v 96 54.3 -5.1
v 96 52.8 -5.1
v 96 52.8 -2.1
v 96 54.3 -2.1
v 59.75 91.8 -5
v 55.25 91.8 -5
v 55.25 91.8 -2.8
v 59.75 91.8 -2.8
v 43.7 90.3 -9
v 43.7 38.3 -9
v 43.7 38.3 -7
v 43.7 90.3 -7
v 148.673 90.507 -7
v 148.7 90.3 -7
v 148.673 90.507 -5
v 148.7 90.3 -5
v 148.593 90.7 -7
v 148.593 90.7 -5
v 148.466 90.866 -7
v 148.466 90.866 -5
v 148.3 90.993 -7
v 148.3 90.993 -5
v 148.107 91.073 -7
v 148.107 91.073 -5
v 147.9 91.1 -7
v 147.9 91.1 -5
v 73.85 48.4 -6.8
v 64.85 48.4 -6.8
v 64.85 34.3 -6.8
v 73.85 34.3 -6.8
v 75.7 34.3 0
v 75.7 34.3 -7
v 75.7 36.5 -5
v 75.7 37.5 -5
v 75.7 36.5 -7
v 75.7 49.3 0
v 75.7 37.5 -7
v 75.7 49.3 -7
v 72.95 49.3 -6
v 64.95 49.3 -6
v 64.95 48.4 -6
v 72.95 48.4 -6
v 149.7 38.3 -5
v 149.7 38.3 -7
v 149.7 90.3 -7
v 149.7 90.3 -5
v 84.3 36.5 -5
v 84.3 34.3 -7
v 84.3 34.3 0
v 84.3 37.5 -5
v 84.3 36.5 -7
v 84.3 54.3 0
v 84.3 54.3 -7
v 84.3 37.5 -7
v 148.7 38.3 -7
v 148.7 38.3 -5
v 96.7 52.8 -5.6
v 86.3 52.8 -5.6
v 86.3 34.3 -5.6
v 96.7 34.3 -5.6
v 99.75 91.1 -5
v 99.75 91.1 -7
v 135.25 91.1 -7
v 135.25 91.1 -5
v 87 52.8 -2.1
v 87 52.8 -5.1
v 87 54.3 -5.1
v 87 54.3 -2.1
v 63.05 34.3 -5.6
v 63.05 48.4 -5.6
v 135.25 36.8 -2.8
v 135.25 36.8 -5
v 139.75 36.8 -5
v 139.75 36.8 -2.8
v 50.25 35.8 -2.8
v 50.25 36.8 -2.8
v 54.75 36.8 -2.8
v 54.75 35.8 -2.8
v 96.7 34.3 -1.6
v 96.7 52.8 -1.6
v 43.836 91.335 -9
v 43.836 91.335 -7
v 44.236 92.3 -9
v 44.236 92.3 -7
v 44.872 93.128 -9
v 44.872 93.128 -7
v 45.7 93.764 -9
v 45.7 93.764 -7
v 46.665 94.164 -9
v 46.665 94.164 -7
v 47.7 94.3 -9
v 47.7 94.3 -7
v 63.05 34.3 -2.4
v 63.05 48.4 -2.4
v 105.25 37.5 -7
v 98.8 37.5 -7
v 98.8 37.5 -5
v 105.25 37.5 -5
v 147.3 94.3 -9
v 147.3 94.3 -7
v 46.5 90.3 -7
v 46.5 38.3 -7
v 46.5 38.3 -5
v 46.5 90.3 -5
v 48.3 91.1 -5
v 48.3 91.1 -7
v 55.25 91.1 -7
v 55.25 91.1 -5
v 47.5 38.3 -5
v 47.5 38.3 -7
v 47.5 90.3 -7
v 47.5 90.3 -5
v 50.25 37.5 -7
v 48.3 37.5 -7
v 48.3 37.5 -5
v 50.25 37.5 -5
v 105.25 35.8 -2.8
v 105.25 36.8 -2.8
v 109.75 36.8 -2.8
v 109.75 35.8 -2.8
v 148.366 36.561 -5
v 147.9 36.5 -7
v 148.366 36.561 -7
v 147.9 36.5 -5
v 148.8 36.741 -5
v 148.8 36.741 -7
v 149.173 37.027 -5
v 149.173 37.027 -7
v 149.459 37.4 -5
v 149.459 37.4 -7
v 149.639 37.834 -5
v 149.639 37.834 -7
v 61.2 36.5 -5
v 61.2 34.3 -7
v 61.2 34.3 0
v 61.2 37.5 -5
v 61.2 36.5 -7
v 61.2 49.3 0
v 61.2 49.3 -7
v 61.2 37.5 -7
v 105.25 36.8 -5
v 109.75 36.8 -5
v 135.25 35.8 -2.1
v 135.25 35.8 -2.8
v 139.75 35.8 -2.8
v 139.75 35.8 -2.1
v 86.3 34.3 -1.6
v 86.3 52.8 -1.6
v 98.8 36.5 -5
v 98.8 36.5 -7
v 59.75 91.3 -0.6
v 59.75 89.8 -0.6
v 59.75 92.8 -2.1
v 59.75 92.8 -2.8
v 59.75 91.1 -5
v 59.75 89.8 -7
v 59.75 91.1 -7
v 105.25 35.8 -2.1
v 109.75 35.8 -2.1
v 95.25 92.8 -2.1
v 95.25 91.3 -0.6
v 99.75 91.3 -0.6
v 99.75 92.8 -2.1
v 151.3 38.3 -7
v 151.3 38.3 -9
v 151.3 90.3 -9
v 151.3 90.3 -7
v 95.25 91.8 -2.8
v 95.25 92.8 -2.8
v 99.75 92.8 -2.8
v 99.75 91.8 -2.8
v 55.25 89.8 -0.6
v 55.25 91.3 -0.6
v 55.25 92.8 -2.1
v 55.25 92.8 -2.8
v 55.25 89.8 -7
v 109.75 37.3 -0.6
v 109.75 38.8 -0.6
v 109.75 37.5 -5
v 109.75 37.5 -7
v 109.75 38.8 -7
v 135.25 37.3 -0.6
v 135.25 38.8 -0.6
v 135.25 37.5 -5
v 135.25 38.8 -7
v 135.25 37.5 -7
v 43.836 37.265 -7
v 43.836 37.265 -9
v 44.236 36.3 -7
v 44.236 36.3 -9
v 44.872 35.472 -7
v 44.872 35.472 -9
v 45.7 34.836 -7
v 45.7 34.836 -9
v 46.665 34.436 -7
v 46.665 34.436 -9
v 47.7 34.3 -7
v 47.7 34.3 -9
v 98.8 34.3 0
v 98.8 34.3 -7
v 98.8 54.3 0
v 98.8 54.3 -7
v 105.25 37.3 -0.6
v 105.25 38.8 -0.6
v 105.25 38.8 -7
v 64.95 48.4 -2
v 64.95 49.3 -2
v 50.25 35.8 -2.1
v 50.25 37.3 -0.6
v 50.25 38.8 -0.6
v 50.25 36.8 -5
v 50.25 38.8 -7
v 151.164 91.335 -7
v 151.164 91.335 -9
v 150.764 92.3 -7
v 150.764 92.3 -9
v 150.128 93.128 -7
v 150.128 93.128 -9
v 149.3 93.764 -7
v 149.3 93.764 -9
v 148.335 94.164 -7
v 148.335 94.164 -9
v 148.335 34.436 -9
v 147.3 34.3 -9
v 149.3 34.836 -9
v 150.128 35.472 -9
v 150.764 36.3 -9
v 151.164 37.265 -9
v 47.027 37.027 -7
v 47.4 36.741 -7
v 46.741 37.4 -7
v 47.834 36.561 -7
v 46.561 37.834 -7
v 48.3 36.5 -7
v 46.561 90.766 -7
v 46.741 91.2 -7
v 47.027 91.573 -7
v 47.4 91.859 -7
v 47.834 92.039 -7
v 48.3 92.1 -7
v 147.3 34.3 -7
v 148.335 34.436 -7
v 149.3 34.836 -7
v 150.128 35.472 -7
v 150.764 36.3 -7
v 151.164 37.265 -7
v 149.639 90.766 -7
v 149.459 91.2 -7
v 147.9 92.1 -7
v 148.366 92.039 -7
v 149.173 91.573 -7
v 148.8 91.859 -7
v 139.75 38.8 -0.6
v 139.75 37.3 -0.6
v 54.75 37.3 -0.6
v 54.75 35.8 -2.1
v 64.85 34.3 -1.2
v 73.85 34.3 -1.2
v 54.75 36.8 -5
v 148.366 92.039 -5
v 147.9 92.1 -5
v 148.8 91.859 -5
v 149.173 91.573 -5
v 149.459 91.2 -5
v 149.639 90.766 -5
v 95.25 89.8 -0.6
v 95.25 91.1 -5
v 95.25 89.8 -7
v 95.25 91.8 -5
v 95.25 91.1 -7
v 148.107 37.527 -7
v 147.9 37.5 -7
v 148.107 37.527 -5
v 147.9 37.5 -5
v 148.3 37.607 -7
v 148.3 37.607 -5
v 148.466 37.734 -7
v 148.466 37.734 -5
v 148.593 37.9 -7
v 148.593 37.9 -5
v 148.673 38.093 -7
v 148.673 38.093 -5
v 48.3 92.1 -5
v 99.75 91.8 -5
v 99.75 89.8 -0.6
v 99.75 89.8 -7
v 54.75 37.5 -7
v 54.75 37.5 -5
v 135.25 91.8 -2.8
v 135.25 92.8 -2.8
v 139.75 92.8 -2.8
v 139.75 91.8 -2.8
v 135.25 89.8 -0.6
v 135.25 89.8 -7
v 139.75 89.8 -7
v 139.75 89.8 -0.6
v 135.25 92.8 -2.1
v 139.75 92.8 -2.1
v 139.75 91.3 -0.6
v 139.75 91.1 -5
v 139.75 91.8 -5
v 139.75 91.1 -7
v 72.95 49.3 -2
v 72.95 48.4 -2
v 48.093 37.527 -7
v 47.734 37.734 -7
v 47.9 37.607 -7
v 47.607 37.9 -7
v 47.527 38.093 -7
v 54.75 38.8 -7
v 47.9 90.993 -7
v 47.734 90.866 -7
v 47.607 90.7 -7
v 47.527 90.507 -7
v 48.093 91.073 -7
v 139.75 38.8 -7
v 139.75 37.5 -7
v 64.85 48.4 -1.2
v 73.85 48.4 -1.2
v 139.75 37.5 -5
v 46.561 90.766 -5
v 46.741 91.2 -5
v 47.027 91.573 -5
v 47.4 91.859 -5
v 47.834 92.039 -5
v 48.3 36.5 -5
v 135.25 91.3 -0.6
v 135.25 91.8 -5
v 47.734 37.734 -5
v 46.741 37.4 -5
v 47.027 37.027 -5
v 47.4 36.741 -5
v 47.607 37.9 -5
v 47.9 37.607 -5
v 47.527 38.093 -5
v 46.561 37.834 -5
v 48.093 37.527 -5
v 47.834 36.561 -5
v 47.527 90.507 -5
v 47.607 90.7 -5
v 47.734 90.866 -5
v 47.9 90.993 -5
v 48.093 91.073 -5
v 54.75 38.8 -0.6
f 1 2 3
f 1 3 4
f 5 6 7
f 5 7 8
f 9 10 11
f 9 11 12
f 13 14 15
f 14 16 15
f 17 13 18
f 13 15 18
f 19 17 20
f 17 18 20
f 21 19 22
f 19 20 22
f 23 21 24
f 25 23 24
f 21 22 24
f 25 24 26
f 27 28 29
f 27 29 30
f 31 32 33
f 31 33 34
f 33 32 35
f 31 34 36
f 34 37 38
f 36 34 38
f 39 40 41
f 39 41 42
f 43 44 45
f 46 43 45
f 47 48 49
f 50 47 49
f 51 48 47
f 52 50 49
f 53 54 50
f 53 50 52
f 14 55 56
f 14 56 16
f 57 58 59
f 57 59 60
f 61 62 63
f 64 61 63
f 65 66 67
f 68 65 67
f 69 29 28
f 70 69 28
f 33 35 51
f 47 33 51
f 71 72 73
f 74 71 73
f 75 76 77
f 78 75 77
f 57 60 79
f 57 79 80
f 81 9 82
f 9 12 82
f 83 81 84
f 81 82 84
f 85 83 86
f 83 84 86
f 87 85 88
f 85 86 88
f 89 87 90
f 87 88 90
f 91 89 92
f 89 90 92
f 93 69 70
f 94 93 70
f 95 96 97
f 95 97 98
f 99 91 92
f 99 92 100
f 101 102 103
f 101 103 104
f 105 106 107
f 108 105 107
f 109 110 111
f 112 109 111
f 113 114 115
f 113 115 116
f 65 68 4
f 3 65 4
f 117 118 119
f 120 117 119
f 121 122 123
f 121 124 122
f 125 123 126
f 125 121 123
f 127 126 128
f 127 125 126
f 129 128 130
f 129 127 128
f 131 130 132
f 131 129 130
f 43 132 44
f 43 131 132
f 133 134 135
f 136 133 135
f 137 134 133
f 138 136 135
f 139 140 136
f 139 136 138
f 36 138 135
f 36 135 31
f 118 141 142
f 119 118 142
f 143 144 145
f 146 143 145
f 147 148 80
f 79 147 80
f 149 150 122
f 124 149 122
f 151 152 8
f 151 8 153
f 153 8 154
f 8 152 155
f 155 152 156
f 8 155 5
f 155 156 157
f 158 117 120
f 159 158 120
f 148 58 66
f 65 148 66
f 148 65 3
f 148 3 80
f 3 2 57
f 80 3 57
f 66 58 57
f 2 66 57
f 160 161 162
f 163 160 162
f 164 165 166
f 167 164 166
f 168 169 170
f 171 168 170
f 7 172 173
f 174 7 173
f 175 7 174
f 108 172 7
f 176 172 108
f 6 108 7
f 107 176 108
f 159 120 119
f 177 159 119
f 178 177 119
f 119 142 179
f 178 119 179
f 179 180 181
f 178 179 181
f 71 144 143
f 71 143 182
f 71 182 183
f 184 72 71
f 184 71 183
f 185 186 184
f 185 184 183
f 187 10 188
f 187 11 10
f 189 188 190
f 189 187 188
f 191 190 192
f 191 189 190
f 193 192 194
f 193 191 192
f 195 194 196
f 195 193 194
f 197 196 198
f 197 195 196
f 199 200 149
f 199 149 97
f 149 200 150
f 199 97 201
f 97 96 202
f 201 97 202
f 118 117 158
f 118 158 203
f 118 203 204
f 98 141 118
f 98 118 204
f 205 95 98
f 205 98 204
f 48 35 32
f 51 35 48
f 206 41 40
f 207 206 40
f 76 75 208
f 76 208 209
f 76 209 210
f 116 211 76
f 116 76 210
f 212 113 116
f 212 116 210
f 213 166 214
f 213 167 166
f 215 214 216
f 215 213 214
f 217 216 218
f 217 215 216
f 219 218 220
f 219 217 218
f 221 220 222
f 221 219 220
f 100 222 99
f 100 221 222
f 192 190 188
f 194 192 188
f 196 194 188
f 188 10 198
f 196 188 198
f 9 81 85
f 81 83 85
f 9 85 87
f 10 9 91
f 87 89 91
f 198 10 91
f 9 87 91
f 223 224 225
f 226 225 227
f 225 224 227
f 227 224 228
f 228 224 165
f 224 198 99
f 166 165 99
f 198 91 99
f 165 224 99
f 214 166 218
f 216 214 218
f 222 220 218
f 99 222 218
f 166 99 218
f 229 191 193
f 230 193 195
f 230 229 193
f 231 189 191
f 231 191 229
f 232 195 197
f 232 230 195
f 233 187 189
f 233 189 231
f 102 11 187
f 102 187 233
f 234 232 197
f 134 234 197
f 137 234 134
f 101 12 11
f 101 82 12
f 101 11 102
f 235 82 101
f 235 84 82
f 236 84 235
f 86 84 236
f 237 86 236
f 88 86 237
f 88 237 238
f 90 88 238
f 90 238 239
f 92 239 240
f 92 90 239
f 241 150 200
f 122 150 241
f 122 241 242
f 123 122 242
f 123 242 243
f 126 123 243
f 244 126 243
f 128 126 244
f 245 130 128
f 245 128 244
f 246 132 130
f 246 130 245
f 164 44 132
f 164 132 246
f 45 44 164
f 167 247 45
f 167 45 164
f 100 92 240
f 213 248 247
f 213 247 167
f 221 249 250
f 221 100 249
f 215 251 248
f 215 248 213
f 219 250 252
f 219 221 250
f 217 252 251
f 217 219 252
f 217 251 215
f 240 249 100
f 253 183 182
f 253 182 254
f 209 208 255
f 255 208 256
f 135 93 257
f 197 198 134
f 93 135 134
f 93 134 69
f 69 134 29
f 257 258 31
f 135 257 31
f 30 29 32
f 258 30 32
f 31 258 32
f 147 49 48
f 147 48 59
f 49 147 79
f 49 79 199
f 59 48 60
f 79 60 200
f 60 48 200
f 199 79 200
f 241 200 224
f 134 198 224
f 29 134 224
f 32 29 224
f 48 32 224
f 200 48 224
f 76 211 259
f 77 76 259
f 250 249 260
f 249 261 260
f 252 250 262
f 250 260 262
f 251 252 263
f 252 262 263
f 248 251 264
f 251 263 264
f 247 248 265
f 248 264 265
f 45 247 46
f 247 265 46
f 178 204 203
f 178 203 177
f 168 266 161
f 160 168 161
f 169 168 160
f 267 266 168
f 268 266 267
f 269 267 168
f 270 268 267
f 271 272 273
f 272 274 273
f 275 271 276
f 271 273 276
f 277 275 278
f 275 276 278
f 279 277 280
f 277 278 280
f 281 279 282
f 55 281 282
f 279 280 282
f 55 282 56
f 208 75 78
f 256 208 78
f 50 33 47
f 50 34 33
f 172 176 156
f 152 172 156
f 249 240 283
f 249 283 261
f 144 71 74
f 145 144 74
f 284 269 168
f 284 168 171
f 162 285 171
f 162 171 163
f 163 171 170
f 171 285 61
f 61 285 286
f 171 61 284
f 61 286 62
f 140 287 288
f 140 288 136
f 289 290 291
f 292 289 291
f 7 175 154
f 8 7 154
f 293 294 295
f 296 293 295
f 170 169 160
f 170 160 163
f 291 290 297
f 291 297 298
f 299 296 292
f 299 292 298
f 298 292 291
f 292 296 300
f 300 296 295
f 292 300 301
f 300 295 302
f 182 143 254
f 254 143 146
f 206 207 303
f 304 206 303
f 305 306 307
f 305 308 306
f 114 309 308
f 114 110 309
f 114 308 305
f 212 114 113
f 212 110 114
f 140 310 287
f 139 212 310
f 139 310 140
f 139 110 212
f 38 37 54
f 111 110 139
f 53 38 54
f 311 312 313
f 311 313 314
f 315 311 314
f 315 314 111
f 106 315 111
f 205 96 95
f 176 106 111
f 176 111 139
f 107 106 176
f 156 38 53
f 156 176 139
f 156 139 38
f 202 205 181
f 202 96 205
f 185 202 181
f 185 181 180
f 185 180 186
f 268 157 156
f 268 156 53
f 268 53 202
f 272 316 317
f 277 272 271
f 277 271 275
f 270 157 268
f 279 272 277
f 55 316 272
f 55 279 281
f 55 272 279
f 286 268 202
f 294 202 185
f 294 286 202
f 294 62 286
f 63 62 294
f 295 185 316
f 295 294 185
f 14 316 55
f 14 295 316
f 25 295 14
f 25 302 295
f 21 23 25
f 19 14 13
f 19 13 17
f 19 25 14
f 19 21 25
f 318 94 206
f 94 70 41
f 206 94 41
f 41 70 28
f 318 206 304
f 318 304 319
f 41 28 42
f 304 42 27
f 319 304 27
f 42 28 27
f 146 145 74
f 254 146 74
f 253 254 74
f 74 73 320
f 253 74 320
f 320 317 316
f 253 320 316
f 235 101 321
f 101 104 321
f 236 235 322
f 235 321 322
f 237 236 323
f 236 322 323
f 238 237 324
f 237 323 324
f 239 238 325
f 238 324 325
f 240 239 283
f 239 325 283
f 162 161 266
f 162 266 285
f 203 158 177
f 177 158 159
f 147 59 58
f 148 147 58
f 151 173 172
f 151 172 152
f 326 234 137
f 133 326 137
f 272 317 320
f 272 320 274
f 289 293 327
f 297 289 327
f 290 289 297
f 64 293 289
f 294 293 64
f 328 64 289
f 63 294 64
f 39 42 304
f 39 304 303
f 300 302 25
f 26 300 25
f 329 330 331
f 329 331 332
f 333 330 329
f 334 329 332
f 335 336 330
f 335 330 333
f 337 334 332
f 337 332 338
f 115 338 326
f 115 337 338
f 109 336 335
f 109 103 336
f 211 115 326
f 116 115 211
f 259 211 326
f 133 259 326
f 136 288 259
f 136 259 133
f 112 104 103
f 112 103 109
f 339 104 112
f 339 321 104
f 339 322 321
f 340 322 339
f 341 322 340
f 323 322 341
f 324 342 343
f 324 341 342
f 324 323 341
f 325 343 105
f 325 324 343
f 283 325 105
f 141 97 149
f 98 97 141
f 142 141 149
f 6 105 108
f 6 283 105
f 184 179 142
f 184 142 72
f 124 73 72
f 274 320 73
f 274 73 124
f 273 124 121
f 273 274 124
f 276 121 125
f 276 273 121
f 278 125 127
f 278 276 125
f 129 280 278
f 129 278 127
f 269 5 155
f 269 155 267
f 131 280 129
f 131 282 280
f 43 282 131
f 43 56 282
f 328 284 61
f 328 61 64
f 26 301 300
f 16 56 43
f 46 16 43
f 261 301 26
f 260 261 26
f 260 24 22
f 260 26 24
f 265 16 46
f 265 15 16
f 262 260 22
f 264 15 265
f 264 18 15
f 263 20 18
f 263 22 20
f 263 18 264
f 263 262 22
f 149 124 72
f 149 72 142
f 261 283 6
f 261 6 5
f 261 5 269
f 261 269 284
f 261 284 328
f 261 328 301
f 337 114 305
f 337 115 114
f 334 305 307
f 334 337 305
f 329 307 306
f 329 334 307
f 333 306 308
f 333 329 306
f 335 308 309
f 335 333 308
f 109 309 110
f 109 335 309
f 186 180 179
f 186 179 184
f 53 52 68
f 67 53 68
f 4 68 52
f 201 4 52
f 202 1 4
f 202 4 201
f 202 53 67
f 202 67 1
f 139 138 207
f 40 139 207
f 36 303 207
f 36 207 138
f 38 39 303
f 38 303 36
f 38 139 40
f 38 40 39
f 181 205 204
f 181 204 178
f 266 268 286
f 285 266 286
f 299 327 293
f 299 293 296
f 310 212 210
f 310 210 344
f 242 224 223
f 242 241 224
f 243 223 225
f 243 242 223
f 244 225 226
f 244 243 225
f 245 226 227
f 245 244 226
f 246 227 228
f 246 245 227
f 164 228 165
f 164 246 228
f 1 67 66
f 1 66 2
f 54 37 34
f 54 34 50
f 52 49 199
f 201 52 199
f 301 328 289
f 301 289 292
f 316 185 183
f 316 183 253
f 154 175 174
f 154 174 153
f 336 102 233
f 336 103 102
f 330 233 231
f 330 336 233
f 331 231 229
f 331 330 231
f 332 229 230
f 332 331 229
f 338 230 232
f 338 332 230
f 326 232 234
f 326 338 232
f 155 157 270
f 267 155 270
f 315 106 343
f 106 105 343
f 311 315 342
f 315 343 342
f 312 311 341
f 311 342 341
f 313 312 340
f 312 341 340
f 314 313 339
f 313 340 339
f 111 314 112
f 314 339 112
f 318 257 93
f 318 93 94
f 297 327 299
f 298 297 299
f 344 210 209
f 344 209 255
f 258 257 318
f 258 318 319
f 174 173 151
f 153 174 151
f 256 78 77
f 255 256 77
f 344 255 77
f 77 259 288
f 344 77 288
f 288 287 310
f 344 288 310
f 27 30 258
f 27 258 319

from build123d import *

# Parameters (mm, degrees)
BOX096_W         = 10.8
BOX096_H         = 15
BOX096_DEPTH     = 5.6
CHAMFER007_SIZE2 = 1.8
CHAMFER007_SIZE  = 1.2
BOX097_W         = 8
BOX097_H         = 10
BOX097_DEPTH     = 4
BOX098_W         = 10.4
BOX098_H         = 18.5
BOX098_DEPTH     = 4
BOX099_W         = 9
BOX099_H         = 18
BOX099_DEPTH     = 3
BOX094_W         = 14.5
BOX094_H         = 15
BOX094_DEPTH     = 7
BOX095_W         = 14.5
BOX095_H         = 20
BOX095_DEPTH     = 7
BOX089_W         = 4.5
BOX089_H         = 2
BOX089_DEPTH     = 6
BOX090_W         = 4.5
BOX090_H         = 2
BOX090_DEPTH     = 6
BOX091_W         = 4.5
BOX091_H         = 2
BOX091_DEPTH     = 6
BOX086_W         = 4.5
BOX086_H         = 2
BOX086_DEPTH     = 6
BOX087_W         = 4.5
BOX087_H         = 2
BOX087_DEPTH     = 6
BOX088_W         = 4.5
BOX088_H         = 2
BOX088_DEPTH     = 6
BOX083_W         = 4.5
BOX083_H         = 3
BOX083_DEPTH     = 2.2
BOX084_W         = 4.5
BOX084_H         = 3
BOX084_DEPTH     = 2.2
BOX085_W         = 4.5
BOX085_H         = 3
BOX085_DEPTH     = 2.2
BOX080_W         = 4.5
BOX080_H         = 3
BOX080_DEPTH     = 2.2
BOX081_W         = 4.5
BOX081_H         = 3
BOX081_DEPTH     = 2.2
BOX082_W         = 4.5
BOX082_H         = 3
BOX082_DEPTH     = 2.2
CHAMFER006_SIZE  = 1.5
BOX079_W         = 107.6
BOX079_H         = 60
BOX079_DEPTH     = 2
FILLET015_R      = 4
BOX093_W         = 101.2
BOX093_H         = 53.6
BOX093_DEPTH     = 2
BOX092_W         = 103.2
BOX092_H         = 55.6
BOX092_DEPTH     = 2
FILLET016_1_R    = 1.8
FILLET016_2_R    = 0.8


with BuildPart() as chamfer007:
    # Box096 → Box096 (new body)
    with BuildSketch(Plane(origin=(19, 0, 0), x_dir=(1, 0, 0), z_dir=(0, 0, 1))):
        with Locations((5.4, 7.5)):
            Rectangle(BOX096_W, BOX096_H)
    extrude(amount=BOX096_DEPTH)

    # Chamfer007
    chamfer007_edges = [chamfer007.edges().sort_by_distance(p)[0] for p in [
        (19, 7.5, 5.6),
        (19, 7.5, 0),
    ]]
    chamfer007_side = chamfer007.faces().sort_by_distance((19, 7.5, 2.8))[0]
    chamfer(chamfer007_edges, length=CHAMFER007_SIZE, length2=CHAMFER007_SIZE2, reference=chamfer007_side)


with BuildPart() as chamfer007_1:
    # Chamfer007 placement: moved
    add(chamfer007.part.moved(Location((44.1, 33.4, -1.8))))


with BuildPart() as fusion058:
    # Box097 → Box097 (new body)
    with BuildSketch(Plane(origin=(65, 42, -1), x_dir=(1, 0, 0), z_dir=(0, 0, 1))):
        with Locations((4, 5)):
            Rectangle(BOX097_W, BOX097_H)
    extrude(amount=BOX097_DEPTH)

    # Fusion058: union Chamfer007
    add(chamfer007_1.part)


with BuildPart() as fusion058_1:
    # Fusion058 placement: moved
    add(fusion058.part.moved(Location((-0.05, 0, 0))))


with BuildPart() as cubo098:
    # Box098 → Box098 (new body)
    with BuildSketch(Plane.XY.offset(-0.1)):
        with Locations((5.2, 9.25)):
            Rectangle(BOX098_W, BOX098_H)
    extrude(amount=BOX098_DEPTH)


with BuildPart() as fusion061:
    # Box099 → Box099 (new body)
    with BuildSketch(Plane(origin=(0.7, 8, 0.4), x_dir=(1, 0, 0), z_dir=(0, 0, 1))):
        with Locations((4.5, 9)):
            Rectangle(BOX099_W, BOX099_H)
    extrude(amount=BOX099_DEPTH)

    # Fusion060: union Cubo098
    add(cubo098.part)


with BuildPart() as fusion061_1:
    # Fusion060 placement: moved
    add(fusion061.part.moved(Location((86.3, 34.3, -0.5))))

    # Fusion061: union Fusion058
    add(fusion058_1.part)


with BuildPart() as cubo094:
    # Box094 → Box094 (new body)
    with BuildSketch(Plane(origin=(61.2, 34.3, -2), x_dir=(1, 0, 0), z_dir=(0, 0, 1))):
        with Locations((7.25, 7.5)):
            Rectangle(BOX094_W, BOX094_H)
    extrude(amount=BOX094_DEPTH)


with BuildPart() as cubo095:
    # Box095 → Box095 (new body)
    with BuildSketch(Plane(origin=(84.3, 34.3, -2), x_dir=(1, 0, 0), z_dir=(0, 0, 1))):
        with Locations((7.25, 10)):
            Rectangle(BOX095_W, BOX095_H)
    extrude(amount=BOX095_DEPTH)


with BuildPart() as cubo089:
    # Box089 → Box089 (new body)
    with BuildSketch(Plane(origin=(0, -2, -5), x_dir=(1, 0, 0), z_dir=(0, 0, 1))):
        with Locations((2.25, 1)):
            Rectangle(BOX089_W, BOX089_H)
    extrude(amount=BOX089_DEPTH)


with BuildPart() as cubo090:
    # Box090 → Box090 (new body)
    with BuildSketch(Plane(origin=(40, -2, -5), x_dir=(1, 0, 0), z_dir=(0, 0, 1))):
        with Locations((2.25, 1)):
            Rectangle(BOX090_W, BOX090_H)
    extrude(amount=BOX090_DEPTH)


with BuildPart() as fusion054:
    # Box091 → Box091 (new body)
    with BuildSketch(Plane(origin=(80, -2, -5), x_dir=(1, 0, 0), z_dir=(0, 0, 1))):
        with Locations((2.25, 1)):
            Rectangle(BOX091_W, BOX091_H)
    extrude(amount=BOX091_DEPTH)

    # Fusion054: union Cubo089, Cubo090
    add(cubo089.part)
    add(cubo090.part)


with BuildPart() as fusion054_1:
    # Fusion054 placement: moved
    add(fusion054.part.moved(Location((55, 91.8, 2))))


with BuildPart() as cubo086:
    # Box086 → Box086 (new body)
    with BuildSketch(Plane(origin=(-5, 1, -5), x_dir=(1, 0, 0), z_dir=(0, 0, 1))):
        with Locations((2.25, 1)):
            Rectangle(BOX086_W, BOX086_H)
    extrude(amount=BOX086_DEPTH)


with BuildPart() as cubo087:
    # Box087 → Box087 (new body)
    with BuildSketch(Plane(origin=(50, 1, -5), x_dir=(1, 0, 0), z_dir=(0, 0, 1))):
        with Locations((2.25, 1)):
            Rectangle(BOX087_W, BOX087_H)
    extrude(amount=BOX087_DEPTH)


with BuildPart() as fusion055:
    # Box088 → Box088 (new body)
    with BuildSketch(Plane(origin=(80, 1, -5), x_dir=(1, 0, 0), z_dir=(0, 0, 1))):
        with Locations((2.25, 1)):
            Rectangle(BOX088_W, BOX088_H)
    extrude(amount=BOX088_DEPTH)

    # Fusion053: union Cubo086, Cubo087
    add(cubo086.part)
    add(cubo087.part)


with BuildPart() as fusion055_1:
    # Fusion053 placement: moved
    add(fusion055.part.moved(Location((55, 35.8, 2))))

    # Fusion055: union Fusion054
    add(fusion054_1.part)


with BuildPart() as cubo083:
    # Box083 → Box083 (new body)
    with BuildSketch(Plane(origin=(0, -2, 0.2), x_dir=(1, 0, 0), z_dir=(0, 0, 1))):
        with Locations((2.25, 1.5)):
            Rectangle(BOX083_W, BOX083_H)
    extrude(amount=BOX083_DEPTH)


with BuildPart() as cubo084:
    # Box084 → Box084 (new body)
    with BuildSketch(Plane(origin=(40, -2, 0.2), x_dir=(1, 0, 0), z_dir=(0, 0, 1))):
        with Locations((2.25, 1.5)):
            Rectangle(BOX084_W, BOX084_H)
    extrude(amount=BOX084_DEPTH)


with BuildPart() as fusion051:
    # Box085 → Box085 (new body)
    with BuildSketch(Plane(origin=(80, -2, 0.2), x_dir=(1, 0, 0), z_dir=(0, 0, 1))):
        with Locations((2.25, 1.5)):
            Rectangle(BOX085_W, BOX085_H)
    extrude(amount=BOX085_DEPTH)

    # Fusion051: union Cubo083, Cubo084
    add(cubo083.part)
    add(cubo084.part)


with BuildPart() as fusion051_1:
    # Fusion051 placement: moved
    add(fusion051.part.moved(Location((55, 91.8, 2))))


with BuildPart() as cubo080:
    # Box080 → Box080 (new body)
    with BuildSketch(Plane(origin=(-5, 0, 0.2), x_dir=(1, 0, 0), z_dir=(0, 0, 1))):
        with Locations((2.25, 1.5)):
            Rectangle(BOX080_W, BOX080_H)
    extrude(amount=BOX080_DEPTH)


with BuildPart() as cubo081:
    # Box081 → Box081 (new body)
    with BuildSketch(Plane(origin=(50, 0, 0.2), x_dir=(1, 0, 0), z_dir=(0, 0, 1))):
        with Locations((2.25, 1.5)):
            Rectangle(BOX081_W, BOX081_H)
    extrude(amount=BOX081_DEPTH)


with BuildPart() as chamfer006:
    # Box082 → Box082 (new body)
    with BuildSketch(Plane(origin=(80, 0, 0.2), x_dir=(1, 0, 0), z_dir=(0, 0, 1))):
        with Locations((2.25, 1.5)):
            Rectangle(BOX082_W, BOX082_H)
    extrude(amount=BOX082_DEPTH)

    # Fusion050: union Cubo080, Cubo081
    add(cubo080.part)
    add(cubo081.part)


with BuildPart() as chamfer006_1:
    # Fusion050 placement: moved
    add(chamfer006.part.moved(Location((55, 35.8, 2))))

    # Fusion052: union Fusion051
    add(fusion051_1.part)

    # Fusion056: union Fusion055
    add(fusion055_1.part)

    # Chamfer006
    chamfer006_edges = [chamfer006_1.edges().sort_by_distance(p)[0] for p in [
        (137.25, 35.8, 4.4),
        (52.25, 35.8, 4.4),
        (107.25, 35.8, 4.4),
        (137.25, 92.8, 4.4),
        (57.25, 92.8, 4.4),
        (97.25, 92.8, 4.4),
    ]]
    chamfer(chamfer006_edges, length=CHAMFER006_SIZE)


with BuildPart() as chamfer006_2:
    # Chamfer006 placement: moved
    add(chamfer006_1.part.moved(Location((0.25, 0, 0))))


with BuildPart() as fillet015:
    # Box079 → Box079 (new body)
    with BuildSketch(Plane(origin=(43.7, 34.3, -4), x_dir=(1, 0, 0), z_dir=(0, 0, 1))):
        with Locations((53.8, 30)):
            Rectangle(BOX079_W, BOX079_H)
    extrude(amount=BOX079_DEPTH)

    # Fillet015
    fillet015_edges = [fillet015.edges().sort_by_distance(p)[0] for p in [
        (43.7, 34.3, -3),
        (43.7, 94.3, -3),
        (151.3, 34.3, -3),
        (151.3, 94.3, -3),
    ]]
    fillet(fillet015_edges, radius=FILLET015_R)


with BuildPart() as cubo093:
    # Box093 → Box093 (new body)
    with BuildSketch(Plane(origin=(49.7, 35.3, -2), x_dir=(1, 0, 0), z_dir=(0, 0, 1))):
        with Locations((50.6, 26.8)):
            Rectangle(BOX093_W, BOX093_H)
    extrude(amount=BOX093_DEPTH)


with BuildPart() as base:
    # Box092 → Box092 (new body)
    with BuildSketch(Plane(origin=(48.7, 34.3, -2), x_dir=(1, 0, 0), z_dir=(0, 0, 1))):
        with Locations((51.6, 27.8)):
            Rectangle(BOX092_W, BOX092_H)
    extrude(amount=BOX092_DEPTH)

    # Cut019: cut Cubo093
    add(cubo093.part, mode=Mode.SUBTRACT)

    # Fillet016 1
    fillet016_1_edges = [base.edges().sort_by_distance(p)[0] for p in [
        (48.7, 34.3, -1),
        (48.7, 89.9, -1),
        (151.9, 34.3, -1),
        (151.9, 89.9, -1),
    ]]
    fillet(fillet016_1_edges, radius=FILLET016_1_R)

    # Fillet016 2
    fillet016_2_edges = [base.edges().sort_by_distance(p)[0] for p in [
        (150.9, 35.3, -1),
        (49.7, 35.3, -1),
        (150.9, 88.9, -1),
        (49.7, 88.9, -1),
    ]]
    fillet(fillet016_2_edges, radius=FILLET016_2_R)


with BuildPart() as base_1:
    # Fillet016 placement: moved
    add(base.part.moved(Location((-2.2, 2.2, 0))))

    # Fusion057: union Chamfer006, Fillet015
    add(chamfer006_2.part)
    add(fillet015.part)

    # Fusion059: union Cubo094, Cubo095
    add(cubo094.part)
    add(cubo095.part)

    # Cut020: cut Fusion061
    add(fusion061_1.part, mode=Mode.SUBTRACT)


with BuildPart() as base_2:
    # Cut020 placement: moved
    add(base_1.part.moved(Location((0, 0, -5))))


solid = base_2.part
